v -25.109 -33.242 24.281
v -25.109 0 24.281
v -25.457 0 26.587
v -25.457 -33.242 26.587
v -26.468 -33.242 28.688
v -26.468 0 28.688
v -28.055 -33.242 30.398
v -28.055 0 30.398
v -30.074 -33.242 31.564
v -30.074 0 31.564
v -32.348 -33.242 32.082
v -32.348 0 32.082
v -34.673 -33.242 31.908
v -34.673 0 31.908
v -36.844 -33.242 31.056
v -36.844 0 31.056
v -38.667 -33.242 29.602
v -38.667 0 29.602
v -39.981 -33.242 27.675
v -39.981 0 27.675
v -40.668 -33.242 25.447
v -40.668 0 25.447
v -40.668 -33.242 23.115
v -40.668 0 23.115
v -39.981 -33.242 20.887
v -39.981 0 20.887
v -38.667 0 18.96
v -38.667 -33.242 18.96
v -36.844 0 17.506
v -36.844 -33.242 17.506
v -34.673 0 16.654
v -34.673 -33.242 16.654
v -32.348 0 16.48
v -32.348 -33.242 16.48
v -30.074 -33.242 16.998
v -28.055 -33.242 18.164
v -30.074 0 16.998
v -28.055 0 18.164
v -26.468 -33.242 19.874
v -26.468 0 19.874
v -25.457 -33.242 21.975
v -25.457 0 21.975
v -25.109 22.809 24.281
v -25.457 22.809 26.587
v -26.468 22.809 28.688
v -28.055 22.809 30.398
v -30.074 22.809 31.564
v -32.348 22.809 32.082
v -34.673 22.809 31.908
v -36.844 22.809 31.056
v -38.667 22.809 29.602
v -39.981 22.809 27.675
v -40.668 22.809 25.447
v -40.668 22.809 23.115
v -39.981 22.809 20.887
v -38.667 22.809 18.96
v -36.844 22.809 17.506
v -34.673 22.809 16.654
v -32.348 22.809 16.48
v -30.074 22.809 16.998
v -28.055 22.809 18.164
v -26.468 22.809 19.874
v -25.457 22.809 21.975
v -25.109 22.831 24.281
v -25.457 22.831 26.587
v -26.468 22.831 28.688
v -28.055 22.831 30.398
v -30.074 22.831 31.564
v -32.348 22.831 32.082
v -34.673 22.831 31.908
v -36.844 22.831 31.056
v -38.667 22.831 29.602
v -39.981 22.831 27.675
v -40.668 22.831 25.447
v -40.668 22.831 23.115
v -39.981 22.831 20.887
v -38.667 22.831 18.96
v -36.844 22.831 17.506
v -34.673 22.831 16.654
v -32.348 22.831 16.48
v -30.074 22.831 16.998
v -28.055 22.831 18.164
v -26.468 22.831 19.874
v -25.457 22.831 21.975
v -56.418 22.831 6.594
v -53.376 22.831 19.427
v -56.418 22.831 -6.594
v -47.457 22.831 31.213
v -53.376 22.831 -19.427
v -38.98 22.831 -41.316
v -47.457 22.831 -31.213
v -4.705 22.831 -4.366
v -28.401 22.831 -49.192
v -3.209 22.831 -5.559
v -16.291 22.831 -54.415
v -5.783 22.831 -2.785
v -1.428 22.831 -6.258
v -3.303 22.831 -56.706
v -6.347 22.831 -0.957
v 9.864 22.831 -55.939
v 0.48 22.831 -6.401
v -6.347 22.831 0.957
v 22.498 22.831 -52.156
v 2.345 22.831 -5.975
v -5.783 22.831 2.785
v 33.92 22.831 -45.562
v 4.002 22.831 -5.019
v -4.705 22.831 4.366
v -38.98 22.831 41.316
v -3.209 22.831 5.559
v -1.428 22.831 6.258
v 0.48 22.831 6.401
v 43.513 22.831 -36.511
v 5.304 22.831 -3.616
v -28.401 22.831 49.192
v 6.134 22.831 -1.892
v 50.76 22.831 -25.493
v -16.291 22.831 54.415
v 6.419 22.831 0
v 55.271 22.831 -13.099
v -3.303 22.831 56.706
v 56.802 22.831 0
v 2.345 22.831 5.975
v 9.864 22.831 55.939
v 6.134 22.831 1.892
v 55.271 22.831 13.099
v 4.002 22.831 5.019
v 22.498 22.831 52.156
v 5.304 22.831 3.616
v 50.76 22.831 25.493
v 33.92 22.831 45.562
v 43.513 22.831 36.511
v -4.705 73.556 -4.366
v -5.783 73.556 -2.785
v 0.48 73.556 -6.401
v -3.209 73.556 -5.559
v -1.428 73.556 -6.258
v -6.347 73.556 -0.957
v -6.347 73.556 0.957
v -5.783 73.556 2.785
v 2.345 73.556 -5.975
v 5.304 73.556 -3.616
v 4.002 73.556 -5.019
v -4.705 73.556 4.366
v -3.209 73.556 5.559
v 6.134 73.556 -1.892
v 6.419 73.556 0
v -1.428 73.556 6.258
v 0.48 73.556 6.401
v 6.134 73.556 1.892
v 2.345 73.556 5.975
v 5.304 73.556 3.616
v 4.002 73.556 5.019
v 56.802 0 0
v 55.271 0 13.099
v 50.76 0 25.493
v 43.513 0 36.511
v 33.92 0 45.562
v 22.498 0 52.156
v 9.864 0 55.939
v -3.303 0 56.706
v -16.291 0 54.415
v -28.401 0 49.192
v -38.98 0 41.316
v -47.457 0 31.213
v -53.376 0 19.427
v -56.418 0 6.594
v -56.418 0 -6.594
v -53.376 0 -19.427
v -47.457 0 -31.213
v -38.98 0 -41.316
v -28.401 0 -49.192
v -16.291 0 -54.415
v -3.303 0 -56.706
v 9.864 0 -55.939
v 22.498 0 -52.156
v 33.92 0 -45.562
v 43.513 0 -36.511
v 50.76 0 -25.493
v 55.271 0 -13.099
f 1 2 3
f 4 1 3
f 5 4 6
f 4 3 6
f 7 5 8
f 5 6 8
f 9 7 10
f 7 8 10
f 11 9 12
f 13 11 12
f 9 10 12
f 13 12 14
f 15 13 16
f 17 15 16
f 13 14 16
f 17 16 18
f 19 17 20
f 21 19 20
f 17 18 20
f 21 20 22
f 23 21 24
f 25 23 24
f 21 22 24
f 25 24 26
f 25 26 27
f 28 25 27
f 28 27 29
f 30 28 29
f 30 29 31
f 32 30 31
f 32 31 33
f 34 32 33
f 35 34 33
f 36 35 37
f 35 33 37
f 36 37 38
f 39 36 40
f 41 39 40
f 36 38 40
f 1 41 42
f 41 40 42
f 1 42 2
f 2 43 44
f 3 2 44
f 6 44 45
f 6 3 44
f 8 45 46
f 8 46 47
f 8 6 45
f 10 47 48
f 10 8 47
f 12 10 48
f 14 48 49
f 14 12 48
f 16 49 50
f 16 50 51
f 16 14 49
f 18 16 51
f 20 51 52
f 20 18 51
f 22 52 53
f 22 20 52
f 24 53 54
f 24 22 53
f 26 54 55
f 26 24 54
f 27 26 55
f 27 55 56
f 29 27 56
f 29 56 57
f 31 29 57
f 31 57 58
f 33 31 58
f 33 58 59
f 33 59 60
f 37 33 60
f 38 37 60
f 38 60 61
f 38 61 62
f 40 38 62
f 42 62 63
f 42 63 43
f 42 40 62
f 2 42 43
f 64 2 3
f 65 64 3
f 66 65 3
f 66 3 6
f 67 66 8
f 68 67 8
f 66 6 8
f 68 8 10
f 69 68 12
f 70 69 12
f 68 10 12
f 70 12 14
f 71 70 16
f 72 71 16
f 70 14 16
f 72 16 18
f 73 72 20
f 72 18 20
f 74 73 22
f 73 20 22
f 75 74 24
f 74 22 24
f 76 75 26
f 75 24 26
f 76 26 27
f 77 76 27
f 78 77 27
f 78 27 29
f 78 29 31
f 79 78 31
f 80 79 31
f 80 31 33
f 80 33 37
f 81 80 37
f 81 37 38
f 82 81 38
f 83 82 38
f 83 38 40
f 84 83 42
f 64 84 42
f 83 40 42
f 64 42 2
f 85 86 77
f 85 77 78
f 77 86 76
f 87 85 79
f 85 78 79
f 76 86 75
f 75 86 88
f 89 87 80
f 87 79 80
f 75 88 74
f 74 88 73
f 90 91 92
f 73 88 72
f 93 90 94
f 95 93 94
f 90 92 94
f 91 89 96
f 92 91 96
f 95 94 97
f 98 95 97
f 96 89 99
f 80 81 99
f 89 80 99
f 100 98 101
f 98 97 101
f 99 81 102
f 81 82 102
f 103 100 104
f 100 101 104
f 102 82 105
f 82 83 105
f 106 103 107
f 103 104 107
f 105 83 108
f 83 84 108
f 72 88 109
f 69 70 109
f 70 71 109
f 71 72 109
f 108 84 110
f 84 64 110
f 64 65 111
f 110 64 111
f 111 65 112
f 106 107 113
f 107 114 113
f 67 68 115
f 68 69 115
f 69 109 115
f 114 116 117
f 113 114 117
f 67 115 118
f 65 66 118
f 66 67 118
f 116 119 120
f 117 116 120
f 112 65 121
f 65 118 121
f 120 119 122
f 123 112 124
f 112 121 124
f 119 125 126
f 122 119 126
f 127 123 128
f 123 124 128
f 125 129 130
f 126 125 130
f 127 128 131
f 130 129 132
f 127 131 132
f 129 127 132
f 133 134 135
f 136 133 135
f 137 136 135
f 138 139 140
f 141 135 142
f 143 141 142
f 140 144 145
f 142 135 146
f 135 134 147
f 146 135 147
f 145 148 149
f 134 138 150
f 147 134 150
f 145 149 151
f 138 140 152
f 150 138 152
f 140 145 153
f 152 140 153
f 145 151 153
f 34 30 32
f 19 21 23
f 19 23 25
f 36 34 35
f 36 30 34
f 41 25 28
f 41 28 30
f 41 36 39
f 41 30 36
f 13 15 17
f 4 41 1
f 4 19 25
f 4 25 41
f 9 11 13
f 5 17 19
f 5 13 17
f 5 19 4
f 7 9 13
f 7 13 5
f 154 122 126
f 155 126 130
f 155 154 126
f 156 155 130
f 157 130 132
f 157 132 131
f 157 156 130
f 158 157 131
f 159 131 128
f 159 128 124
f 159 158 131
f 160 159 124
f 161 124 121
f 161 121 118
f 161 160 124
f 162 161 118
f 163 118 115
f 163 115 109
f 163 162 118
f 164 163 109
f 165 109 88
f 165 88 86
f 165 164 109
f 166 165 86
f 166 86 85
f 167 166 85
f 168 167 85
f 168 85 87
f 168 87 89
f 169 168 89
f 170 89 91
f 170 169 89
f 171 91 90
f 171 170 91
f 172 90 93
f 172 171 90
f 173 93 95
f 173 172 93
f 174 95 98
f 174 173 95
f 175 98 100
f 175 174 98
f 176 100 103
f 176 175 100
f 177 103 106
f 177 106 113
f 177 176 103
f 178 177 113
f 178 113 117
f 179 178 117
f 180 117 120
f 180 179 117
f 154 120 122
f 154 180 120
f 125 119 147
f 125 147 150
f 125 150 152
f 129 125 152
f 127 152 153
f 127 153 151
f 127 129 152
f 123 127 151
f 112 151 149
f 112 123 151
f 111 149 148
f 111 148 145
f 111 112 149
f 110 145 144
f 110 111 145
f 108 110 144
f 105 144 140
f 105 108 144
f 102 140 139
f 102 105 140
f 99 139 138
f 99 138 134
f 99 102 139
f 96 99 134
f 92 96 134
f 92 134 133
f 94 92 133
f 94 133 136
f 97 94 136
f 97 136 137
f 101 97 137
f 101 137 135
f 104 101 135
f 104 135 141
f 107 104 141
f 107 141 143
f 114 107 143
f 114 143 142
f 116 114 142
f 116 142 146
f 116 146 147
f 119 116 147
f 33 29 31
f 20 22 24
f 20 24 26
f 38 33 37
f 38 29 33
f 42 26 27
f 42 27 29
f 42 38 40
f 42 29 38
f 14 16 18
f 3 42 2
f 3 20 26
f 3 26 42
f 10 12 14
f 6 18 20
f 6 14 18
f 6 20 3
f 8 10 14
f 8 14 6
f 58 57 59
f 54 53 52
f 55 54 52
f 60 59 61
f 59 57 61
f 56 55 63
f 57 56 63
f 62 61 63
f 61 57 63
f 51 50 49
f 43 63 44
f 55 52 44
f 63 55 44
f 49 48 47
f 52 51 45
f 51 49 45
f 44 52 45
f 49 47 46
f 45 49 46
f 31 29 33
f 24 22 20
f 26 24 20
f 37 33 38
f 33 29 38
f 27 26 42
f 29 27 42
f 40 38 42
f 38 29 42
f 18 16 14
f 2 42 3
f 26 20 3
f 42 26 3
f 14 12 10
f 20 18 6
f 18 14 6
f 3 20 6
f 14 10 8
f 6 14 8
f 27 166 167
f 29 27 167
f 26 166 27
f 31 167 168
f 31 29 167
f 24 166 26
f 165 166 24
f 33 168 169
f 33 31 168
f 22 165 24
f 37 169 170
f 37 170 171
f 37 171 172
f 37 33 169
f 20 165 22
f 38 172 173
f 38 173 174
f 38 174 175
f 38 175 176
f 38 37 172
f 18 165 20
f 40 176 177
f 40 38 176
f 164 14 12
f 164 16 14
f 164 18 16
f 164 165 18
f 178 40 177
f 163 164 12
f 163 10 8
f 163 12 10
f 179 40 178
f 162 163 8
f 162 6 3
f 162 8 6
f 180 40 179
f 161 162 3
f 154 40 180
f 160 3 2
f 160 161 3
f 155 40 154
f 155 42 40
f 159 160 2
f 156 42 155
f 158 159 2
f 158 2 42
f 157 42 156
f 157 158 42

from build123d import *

# Parameters (mm, degrees)
F0_R     = 7.823316
F1_DEPTH = 33.24154
F0_R_2   = 56.801677
F2_DEPTH = 22.83116
F3_D     = 12.7508
F4_DEPTH = 22.80916
F5_R     = 6.418936
F6_DEPTH = 73.55627


with BuildPart() as f1:
    # F0 (on Front) → F1 (new body)
    with BuildSketch(Plane.XZ):
        with Locations((-32.93233, 24.280986)):
            Circle(F0_R)
    extrude(amount=F1_DEPTH)


with BuildPart() as f2:
    # F0 (on Front) → F2 (new body)
    with BuildSketch(Plane.XZ):
        Circle(F0_R_2)
        with Locations((-32.93233, 24.280986)):
            Circle(F0_R, mode=Mode.SUBTRACT)
    extrude(amount=-F2_DEPTH)

    # F3 (through all)
    with Locations(Plane.XZ):
        with Locations((0, 0)):
            Hole(F3_D / 2)

    # F5 (on Front) → F6 (join)
    with BuildSketch(Plane.XZ):
        Circle(F5_R)
    extrude(amount=-F6_DEPTH)


with BuildPart() as f4:
    # F0 (on Front) → F4 (new body)
    with BuildSketch(Plane.XZ):
        with Locations((-32.93233, 24.280986)):
            Circle(F0_R)
    extrude(amount=-F4_DEPTH)


solid = Compound([f1.part, f2.part, f4.part])
